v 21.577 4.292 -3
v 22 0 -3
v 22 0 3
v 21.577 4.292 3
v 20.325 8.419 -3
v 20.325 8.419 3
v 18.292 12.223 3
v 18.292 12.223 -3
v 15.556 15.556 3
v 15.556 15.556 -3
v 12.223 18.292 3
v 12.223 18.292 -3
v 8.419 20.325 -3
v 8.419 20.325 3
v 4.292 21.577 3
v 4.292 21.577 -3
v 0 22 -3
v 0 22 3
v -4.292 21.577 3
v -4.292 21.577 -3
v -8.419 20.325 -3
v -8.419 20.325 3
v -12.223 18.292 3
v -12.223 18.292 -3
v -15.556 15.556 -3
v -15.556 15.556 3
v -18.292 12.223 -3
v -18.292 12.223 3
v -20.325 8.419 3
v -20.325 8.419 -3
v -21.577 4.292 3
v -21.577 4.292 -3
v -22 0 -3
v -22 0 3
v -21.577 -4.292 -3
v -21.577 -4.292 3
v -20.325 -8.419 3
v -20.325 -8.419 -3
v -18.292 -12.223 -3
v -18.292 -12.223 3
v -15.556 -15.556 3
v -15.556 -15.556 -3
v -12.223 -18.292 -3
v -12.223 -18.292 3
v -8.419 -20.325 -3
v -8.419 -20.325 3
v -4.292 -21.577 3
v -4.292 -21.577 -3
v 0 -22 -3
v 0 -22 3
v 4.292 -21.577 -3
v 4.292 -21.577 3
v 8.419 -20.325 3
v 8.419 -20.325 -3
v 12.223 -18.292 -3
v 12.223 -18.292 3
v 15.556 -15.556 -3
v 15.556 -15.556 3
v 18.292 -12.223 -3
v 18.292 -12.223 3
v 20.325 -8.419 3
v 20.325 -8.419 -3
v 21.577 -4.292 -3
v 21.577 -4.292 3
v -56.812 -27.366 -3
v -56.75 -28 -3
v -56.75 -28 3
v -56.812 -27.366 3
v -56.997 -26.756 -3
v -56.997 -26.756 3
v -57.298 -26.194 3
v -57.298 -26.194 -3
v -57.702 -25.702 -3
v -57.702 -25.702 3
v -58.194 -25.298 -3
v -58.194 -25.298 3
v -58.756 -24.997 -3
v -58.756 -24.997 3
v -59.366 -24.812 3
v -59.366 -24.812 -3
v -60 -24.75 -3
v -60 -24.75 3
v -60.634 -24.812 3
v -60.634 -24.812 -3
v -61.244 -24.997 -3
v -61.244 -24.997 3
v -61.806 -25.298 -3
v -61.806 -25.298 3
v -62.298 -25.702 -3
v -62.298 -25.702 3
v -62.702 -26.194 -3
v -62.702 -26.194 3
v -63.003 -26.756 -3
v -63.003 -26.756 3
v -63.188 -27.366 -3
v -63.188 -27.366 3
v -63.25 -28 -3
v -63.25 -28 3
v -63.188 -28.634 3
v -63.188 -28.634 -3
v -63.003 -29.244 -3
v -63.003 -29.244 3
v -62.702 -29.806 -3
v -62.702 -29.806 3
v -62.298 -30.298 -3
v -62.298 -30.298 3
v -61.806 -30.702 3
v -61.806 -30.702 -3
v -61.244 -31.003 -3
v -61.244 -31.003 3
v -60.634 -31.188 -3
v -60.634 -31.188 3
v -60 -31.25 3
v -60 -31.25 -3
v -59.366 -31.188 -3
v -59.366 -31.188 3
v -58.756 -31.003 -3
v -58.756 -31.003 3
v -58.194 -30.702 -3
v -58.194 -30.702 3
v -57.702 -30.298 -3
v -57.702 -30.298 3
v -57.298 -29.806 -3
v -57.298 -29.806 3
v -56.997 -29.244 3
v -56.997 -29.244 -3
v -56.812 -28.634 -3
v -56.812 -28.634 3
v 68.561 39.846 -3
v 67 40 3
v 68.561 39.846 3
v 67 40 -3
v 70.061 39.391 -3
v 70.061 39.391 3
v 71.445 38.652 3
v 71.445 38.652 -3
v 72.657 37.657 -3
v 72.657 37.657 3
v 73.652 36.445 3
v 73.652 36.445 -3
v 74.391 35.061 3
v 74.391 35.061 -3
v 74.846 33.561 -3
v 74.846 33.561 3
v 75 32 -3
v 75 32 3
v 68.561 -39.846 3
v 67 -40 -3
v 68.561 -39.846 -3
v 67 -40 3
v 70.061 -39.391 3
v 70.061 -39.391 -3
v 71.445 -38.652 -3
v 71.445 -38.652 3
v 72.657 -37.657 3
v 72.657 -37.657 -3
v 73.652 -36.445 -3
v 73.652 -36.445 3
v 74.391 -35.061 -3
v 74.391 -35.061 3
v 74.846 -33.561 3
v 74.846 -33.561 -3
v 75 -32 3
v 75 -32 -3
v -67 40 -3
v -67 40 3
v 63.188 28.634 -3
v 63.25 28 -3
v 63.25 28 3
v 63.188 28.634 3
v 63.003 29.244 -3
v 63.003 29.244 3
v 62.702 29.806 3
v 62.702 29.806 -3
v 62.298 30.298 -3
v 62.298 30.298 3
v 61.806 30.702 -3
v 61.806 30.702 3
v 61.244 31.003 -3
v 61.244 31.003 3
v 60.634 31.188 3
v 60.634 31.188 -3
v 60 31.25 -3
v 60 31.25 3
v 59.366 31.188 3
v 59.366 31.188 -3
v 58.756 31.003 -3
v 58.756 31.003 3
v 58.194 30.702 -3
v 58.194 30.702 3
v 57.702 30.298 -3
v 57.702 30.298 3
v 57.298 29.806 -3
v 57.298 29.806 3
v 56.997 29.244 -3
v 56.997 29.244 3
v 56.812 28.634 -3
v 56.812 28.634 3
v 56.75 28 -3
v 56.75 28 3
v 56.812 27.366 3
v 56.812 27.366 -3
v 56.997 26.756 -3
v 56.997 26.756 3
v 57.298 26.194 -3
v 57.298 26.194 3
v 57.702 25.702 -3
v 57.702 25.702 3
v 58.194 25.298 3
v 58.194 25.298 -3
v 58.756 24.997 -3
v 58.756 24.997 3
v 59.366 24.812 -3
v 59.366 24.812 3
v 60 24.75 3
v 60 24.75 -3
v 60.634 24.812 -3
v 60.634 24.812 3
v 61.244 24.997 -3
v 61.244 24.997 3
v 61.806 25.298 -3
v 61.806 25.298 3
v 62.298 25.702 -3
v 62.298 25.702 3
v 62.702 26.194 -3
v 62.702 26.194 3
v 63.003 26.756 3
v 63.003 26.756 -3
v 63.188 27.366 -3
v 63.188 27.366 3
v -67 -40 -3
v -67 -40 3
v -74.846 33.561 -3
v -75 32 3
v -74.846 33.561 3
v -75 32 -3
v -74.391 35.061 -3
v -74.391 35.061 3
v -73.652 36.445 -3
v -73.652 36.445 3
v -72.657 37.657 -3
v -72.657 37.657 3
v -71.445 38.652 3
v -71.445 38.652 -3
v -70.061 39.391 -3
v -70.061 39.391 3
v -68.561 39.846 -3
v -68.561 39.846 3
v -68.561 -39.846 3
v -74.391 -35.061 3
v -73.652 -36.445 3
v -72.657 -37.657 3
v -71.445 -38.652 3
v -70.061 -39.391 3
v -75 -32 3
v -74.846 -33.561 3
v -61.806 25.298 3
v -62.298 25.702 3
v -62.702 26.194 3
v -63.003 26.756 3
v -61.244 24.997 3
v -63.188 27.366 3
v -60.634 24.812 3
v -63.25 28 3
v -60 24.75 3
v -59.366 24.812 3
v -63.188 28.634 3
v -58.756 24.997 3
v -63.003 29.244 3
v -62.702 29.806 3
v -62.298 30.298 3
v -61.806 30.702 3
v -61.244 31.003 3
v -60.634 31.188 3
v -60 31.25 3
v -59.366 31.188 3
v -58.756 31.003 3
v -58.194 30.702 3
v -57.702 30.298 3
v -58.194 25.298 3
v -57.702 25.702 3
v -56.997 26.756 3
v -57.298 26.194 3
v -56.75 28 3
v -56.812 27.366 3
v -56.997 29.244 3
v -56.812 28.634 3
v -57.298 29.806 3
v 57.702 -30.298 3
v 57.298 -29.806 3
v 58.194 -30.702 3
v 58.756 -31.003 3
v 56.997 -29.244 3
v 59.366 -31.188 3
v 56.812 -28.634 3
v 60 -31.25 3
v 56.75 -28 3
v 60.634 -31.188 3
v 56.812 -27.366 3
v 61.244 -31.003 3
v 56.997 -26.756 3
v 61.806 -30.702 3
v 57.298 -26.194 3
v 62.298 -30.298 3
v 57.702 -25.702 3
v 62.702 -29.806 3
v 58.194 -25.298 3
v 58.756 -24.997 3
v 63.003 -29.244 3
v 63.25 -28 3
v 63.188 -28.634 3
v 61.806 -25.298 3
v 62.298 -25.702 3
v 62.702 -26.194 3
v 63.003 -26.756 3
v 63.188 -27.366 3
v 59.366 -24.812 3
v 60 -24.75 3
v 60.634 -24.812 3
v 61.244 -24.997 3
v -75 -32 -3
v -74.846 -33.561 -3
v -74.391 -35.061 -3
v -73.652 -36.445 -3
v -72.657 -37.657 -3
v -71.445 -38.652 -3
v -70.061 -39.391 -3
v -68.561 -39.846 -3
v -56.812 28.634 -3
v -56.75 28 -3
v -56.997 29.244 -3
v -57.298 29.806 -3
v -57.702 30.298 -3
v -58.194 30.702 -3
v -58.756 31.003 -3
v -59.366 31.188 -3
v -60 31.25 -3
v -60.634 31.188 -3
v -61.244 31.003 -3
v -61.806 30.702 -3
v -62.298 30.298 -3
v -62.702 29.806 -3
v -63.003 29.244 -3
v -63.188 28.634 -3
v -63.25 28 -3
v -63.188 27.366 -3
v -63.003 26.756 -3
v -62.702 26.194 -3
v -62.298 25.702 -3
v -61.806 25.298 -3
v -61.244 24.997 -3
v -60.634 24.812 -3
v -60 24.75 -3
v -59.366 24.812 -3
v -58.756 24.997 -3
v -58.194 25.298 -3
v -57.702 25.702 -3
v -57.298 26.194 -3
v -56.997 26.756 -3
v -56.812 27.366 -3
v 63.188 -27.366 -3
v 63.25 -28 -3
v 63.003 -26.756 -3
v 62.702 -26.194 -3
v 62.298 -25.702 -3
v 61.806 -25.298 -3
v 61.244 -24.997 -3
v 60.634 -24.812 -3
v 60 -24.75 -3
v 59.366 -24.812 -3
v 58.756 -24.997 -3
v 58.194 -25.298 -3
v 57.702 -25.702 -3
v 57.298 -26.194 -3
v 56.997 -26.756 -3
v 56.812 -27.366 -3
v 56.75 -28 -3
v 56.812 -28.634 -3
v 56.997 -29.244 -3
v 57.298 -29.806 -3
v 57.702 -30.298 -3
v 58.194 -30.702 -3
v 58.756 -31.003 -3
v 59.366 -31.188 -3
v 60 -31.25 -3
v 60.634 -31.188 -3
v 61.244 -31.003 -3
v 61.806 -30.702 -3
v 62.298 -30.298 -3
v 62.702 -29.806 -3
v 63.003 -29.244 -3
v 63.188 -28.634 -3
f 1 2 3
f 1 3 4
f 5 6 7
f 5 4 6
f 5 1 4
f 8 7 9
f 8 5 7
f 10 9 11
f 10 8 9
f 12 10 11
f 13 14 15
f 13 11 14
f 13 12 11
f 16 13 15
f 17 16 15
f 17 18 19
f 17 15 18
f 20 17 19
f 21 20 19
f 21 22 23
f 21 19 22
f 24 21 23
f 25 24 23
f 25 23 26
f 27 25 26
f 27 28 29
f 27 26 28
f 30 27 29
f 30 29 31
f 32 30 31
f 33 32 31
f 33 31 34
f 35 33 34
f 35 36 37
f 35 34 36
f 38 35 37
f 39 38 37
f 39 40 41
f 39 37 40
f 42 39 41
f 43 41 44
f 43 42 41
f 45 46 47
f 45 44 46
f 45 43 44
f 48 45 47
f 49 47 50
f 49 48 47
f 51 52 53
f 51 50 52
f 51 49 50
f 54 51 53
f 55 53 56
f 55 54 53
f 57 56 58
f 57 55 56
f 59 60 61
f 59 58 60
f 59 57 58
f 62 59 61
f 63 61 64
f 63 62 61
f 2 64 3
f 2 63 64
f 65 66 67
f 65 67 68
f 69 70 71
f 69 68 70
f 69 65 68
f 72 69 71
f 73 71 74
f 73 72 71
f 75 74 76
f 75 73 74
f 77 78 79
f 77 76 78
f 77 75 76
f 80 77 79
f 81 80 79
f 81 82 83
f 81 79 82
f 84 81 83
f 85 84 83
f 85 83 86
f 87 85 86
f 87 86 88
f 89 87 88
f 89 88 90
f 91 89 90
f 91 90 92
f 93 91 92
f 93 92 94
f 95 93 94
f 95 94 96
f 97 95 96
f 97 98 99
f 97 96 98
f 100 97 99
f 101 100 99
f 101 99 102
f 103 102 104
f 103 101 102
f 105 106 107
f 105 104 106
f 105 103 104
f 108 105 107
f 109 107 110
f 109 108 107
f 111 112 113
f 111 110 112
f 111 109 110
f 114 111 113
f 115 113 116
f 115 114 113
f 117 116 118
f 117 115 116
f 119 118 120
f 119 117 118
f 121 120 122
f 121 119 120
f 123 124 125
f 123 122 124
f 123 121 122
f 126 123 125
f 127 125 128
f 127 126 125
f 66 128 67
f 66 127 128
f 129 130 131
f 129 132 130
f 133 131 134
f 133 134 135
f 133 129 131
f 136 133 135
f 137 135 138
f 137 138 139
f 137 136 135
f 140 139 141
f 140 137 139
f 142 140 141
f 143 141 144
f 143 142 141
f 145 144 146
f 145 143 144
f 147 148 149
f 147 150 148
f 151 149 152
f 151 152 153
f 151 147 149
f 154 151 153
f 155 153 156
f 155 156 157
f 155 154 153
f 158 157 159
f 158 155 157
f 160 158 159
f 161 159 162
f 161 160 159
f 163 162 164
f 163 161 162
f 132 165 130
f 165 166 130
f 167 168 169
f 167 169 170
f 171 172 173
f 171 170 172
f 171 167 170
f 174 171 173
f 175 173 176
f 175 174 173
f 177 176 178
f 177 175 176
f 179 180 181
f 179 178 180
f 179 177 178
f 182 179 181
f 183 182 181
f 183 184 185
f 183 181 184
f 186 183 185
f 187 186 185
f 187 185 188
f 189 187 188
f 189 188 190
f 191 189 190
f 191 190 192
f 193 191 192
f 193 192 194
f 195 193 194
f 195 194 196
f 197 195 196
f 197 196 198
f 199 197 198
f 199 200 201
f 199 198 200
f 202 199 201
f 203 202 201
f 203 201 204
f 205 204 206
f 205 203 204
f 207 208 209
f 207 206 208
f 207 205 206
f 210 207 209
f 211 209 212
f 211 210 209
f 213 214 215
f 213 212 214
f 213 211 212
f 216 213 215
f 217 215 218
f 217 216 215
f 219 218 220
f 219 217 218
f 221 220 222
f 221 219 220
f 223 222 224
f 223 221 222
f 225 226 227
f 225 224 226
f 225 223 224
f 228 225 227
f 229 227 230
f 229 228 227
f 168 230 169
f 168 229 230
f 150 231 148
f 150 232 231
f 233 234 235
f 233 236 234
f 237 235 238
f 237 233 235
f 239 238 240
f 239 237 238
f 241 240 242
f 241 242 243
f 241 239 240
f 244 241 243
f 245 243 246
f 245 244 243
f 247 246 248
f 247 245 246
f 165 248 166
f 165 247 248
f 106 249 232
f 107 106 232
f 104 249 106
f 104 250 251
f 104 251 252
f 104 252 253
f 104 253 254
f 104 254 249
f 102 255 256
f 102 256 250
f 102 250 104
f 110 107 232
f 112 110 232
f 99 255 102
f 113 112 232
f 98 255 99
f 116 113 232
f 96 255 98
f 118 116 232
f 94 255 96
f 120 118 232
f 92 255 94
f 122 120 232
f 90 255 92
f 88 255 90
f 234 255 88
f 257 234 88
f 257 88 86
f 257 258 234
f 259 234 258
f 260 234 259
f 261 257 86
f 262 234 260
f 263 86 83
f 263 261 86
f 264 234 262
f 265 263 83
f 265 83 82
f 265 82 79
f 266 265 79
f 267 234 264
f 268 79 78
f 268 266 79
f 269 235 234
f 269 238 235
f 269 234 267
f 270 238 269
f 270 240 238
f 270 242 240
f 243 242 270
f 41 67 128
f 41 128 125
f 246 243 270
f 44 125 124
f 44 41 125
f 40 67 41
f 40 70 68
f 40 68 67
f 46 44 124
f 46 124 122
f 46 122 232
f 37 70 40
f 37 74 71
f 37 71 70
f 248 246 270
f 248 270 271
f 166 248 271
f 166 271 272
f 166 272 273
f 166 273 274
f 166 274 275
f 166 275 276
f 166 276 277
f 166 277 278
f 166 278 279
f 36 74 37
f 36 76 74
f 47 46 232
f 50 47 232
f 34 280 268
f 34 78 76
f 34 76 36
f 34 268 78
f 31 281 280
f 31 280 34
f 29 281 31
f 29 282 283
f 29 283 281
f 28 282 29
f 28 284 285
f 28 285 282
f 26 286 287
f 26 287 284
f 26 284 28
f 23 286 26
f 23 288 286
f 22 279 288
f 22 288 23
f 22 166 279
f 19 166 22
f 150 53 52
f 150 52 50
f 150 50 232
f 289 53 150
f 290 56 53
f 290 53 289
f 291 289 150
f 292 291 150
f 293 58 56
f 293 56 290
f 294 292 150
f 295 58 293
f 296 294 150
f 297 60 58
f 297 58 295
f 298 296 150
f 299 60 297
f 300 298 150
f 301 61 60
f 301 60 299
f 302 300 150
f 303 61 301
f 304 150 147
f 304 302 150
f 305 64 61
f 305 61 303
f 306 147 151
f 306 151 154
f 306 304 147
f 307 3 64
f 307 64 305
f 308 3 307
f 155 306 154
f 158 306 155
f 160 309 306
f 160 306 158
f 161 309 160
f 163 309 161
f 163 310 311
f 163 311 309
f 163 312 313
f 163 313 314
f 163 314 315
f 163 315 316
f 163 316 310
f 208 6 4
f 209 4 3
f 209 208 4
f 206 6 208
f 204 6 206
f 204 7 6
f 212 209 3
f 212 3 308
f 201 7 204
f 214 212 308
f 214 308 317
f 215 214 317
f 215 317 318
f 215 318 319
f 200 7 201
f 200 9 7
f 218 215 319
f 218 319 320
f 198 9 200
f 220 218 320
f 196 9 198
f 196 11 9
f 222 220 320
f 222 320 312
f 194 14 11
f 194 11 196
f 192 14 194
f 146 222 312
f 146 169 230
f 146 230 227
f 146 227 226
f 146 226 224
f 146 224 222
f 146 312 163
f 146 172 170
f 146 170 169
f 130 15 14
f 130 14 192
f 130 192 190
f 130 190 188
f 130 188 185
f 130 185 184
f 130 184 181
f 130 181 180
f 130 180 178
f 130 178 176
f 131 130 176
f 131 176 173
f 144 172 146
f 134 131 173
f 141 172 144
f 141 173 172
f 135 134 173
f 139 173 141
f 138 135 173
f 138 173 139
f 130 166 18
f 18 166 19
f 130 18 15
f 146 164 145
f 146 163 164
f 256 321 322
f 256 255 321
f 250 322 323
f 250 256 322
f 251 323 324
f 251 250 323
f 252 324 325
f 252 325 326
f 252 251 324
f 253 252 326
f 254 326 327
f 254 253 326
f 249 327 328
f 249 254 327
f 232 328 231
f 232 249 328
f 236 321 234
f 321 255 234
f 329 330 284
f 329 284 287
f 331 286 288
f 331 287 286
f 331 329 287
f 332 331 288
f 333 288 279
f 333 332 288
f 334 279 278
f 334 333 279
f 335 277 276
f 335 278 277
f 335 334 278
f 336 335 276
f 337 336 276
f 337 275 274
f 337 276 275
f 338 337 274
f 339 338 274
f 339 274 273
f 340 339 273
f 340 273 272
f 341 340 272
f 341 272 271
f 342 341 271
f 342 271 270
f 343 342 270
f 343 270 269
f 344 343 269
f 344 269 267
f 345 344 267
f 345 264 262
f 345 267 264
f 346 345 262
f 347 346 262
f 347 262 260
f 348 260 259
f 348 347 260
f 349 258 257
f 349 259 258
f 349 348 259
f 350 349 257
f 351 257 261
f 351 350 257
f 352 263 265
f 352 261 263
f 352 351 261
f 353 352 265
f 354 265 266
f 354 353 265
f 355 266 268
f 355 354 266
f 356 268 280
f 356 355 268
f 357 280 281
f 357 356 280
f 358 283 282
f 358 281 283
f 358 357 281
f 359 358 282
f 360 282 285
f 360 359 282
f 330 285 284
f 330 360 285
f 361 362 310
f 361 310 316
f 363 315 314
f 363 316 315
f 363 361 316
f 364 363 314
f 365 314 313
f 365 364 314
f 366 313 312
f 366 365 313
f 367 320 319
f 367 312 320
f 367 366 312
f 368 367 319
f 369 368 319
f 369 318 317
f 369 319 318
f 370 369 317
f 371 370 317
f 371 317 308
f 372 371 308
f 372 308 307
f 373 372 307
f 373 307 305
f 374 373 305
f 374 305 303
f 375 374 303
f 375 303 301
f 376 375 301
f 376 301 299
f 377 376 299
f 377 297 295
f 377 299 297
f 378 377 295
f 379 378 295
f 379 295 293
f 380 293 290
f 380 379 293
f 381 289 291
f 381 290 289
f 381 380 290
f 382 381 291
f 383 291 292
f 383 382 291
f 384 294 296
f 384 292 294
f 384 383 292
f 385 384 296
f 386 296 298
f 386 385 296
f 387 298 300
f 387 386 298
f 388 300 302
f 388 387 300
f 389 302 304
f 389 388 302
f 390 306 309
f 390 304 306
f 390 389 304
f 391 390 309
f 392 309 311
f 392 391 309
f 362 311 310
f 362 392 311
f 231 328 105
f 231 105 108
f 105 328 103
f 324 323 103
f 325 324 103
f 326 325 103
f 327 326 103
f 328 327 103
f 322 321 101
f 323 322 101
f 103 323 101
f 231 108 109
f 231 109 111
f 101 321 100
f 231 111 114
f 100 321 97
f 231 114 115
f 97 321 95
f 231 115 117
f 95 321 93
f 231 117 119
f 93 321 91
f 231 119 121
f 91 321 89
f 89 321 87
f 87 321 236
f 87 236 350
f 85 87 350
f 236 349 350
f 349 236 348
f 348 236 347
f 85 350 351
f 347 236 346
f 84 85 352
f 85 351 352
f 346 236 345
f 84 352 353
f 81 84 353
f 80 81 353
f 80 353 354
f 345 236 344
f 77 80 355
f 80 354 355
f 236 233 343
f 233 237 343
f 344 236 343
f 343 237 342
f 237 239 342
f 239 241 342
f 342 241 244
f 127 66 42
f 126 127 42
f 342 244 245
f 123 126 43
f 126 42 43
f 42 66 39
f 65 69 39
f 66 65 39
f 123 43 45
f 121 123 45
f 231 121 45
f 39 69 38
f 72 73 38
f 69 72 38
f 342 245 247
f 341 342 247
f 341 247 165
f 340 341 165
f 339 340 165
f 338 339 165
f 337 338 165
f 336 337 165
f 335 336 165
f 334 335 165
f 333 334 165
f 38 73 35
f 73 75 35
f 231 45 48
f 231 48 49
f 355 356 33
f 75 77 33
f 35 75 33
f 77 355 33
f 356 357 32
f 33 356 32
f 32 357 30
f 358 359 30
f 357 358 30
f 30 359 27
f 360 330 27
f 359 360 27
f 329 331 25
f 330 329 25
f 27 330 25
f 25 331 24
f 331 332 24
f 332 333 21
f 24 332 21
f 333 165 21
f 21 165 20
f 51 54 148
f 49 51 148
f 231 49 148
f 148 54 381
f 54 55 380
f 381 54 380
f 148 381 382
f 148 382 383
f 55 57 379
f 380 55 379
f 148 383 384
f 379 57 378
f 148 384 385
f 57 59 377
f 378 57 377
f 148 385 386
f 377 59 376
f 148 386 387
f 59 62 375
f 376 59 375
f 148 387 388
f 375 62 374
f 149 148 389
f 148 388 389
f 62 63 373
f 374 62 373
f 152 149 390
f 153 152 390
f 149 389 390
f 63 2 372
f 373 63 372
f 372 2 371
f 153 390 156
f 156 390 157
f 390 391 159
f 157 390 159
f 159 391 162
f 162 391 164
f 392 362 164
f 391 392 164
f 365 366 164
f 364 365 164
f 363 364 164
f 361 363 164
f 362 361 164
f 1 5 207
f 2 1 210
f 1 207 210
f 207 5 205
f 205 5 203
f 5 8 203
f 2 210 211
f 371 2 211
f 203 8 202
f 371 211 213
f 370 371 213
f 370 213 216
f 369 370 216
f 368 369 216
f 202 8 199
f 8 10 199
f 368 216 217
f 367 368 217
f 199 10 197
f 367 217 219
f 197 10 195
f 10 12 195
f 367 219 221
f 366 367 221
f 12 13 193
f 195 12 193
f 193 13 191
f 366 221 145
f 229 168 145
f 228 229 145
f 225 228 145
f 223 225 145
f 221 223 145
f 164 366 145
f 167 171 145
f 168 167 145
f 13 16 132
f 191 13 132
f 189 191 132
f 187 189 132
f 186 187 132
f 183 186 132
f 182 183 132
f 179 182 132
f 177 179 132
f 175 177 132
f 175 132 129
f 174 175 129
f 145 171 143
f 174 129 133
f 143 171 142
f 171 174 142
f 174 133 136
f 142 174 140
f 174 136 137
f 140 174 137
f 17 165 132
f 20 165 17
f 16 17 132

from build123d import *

# Parameters (mm, degrees)
SKETCH2_W               = 150
SKETCH2_H               = 80
BOSS_EXTRUDE1_DEPTH     = 3
CUT_EXTRUDE1_DEPTH      = 86.211501571
CUT_EXTRUDE1_DEPTH_BACK = 86.211501571
SKETCH3_R               = 3.25
SKETCH3_R_2             = 22
FILLET2_R               = 8


with BuildPart() as part:
    # Sketch2 → Boss-Extrude1 (new, symmetric)
    with BuildSketch(Plane.XY):
        Rectangle(SKETCH2_W, SKETCH2_H)
    extrude(amount=BOSS_EXTRUDE1_DEPTH, both=True)

    # Sketch3 → Cut-Extrude1 (cut, two sides: drawn at the far end of the back side and taken through both)
    with BuildSketch(Plane.XY.offset(3).offset(-CUT_EXTRUDE1_DEPTH_BACK)):
        with Locations((-60, 28)):
            Circle(SKETCH3_R)
        with Locations((-60, -28)):
            Circle(SKETCH3_R)
        with Locations((60, -28)):
            Circle(SKETCH3_R)
        with Locations((60, 28)):
            Circle(SKETCH3_R)
        Circle(SKETCH3_R_2)
    extrude(amount=CUT_EXTRUDE1_DEPTH + CUT_EXTRUDE1_DEPTH_BACK, mode=Mode.SUBTRACT)

    # Fillet2
    fillet2_edges = [part.edges().sort_by_distance(p)[0] for p in [
        (75, -40, 0),
        (-75, -40, 0),
        (-75, 40, 0),
        (75, 40, 0),
    ]]
    fillet(fillet2_edges, radius=FILLET2_R)


solid = part.part
